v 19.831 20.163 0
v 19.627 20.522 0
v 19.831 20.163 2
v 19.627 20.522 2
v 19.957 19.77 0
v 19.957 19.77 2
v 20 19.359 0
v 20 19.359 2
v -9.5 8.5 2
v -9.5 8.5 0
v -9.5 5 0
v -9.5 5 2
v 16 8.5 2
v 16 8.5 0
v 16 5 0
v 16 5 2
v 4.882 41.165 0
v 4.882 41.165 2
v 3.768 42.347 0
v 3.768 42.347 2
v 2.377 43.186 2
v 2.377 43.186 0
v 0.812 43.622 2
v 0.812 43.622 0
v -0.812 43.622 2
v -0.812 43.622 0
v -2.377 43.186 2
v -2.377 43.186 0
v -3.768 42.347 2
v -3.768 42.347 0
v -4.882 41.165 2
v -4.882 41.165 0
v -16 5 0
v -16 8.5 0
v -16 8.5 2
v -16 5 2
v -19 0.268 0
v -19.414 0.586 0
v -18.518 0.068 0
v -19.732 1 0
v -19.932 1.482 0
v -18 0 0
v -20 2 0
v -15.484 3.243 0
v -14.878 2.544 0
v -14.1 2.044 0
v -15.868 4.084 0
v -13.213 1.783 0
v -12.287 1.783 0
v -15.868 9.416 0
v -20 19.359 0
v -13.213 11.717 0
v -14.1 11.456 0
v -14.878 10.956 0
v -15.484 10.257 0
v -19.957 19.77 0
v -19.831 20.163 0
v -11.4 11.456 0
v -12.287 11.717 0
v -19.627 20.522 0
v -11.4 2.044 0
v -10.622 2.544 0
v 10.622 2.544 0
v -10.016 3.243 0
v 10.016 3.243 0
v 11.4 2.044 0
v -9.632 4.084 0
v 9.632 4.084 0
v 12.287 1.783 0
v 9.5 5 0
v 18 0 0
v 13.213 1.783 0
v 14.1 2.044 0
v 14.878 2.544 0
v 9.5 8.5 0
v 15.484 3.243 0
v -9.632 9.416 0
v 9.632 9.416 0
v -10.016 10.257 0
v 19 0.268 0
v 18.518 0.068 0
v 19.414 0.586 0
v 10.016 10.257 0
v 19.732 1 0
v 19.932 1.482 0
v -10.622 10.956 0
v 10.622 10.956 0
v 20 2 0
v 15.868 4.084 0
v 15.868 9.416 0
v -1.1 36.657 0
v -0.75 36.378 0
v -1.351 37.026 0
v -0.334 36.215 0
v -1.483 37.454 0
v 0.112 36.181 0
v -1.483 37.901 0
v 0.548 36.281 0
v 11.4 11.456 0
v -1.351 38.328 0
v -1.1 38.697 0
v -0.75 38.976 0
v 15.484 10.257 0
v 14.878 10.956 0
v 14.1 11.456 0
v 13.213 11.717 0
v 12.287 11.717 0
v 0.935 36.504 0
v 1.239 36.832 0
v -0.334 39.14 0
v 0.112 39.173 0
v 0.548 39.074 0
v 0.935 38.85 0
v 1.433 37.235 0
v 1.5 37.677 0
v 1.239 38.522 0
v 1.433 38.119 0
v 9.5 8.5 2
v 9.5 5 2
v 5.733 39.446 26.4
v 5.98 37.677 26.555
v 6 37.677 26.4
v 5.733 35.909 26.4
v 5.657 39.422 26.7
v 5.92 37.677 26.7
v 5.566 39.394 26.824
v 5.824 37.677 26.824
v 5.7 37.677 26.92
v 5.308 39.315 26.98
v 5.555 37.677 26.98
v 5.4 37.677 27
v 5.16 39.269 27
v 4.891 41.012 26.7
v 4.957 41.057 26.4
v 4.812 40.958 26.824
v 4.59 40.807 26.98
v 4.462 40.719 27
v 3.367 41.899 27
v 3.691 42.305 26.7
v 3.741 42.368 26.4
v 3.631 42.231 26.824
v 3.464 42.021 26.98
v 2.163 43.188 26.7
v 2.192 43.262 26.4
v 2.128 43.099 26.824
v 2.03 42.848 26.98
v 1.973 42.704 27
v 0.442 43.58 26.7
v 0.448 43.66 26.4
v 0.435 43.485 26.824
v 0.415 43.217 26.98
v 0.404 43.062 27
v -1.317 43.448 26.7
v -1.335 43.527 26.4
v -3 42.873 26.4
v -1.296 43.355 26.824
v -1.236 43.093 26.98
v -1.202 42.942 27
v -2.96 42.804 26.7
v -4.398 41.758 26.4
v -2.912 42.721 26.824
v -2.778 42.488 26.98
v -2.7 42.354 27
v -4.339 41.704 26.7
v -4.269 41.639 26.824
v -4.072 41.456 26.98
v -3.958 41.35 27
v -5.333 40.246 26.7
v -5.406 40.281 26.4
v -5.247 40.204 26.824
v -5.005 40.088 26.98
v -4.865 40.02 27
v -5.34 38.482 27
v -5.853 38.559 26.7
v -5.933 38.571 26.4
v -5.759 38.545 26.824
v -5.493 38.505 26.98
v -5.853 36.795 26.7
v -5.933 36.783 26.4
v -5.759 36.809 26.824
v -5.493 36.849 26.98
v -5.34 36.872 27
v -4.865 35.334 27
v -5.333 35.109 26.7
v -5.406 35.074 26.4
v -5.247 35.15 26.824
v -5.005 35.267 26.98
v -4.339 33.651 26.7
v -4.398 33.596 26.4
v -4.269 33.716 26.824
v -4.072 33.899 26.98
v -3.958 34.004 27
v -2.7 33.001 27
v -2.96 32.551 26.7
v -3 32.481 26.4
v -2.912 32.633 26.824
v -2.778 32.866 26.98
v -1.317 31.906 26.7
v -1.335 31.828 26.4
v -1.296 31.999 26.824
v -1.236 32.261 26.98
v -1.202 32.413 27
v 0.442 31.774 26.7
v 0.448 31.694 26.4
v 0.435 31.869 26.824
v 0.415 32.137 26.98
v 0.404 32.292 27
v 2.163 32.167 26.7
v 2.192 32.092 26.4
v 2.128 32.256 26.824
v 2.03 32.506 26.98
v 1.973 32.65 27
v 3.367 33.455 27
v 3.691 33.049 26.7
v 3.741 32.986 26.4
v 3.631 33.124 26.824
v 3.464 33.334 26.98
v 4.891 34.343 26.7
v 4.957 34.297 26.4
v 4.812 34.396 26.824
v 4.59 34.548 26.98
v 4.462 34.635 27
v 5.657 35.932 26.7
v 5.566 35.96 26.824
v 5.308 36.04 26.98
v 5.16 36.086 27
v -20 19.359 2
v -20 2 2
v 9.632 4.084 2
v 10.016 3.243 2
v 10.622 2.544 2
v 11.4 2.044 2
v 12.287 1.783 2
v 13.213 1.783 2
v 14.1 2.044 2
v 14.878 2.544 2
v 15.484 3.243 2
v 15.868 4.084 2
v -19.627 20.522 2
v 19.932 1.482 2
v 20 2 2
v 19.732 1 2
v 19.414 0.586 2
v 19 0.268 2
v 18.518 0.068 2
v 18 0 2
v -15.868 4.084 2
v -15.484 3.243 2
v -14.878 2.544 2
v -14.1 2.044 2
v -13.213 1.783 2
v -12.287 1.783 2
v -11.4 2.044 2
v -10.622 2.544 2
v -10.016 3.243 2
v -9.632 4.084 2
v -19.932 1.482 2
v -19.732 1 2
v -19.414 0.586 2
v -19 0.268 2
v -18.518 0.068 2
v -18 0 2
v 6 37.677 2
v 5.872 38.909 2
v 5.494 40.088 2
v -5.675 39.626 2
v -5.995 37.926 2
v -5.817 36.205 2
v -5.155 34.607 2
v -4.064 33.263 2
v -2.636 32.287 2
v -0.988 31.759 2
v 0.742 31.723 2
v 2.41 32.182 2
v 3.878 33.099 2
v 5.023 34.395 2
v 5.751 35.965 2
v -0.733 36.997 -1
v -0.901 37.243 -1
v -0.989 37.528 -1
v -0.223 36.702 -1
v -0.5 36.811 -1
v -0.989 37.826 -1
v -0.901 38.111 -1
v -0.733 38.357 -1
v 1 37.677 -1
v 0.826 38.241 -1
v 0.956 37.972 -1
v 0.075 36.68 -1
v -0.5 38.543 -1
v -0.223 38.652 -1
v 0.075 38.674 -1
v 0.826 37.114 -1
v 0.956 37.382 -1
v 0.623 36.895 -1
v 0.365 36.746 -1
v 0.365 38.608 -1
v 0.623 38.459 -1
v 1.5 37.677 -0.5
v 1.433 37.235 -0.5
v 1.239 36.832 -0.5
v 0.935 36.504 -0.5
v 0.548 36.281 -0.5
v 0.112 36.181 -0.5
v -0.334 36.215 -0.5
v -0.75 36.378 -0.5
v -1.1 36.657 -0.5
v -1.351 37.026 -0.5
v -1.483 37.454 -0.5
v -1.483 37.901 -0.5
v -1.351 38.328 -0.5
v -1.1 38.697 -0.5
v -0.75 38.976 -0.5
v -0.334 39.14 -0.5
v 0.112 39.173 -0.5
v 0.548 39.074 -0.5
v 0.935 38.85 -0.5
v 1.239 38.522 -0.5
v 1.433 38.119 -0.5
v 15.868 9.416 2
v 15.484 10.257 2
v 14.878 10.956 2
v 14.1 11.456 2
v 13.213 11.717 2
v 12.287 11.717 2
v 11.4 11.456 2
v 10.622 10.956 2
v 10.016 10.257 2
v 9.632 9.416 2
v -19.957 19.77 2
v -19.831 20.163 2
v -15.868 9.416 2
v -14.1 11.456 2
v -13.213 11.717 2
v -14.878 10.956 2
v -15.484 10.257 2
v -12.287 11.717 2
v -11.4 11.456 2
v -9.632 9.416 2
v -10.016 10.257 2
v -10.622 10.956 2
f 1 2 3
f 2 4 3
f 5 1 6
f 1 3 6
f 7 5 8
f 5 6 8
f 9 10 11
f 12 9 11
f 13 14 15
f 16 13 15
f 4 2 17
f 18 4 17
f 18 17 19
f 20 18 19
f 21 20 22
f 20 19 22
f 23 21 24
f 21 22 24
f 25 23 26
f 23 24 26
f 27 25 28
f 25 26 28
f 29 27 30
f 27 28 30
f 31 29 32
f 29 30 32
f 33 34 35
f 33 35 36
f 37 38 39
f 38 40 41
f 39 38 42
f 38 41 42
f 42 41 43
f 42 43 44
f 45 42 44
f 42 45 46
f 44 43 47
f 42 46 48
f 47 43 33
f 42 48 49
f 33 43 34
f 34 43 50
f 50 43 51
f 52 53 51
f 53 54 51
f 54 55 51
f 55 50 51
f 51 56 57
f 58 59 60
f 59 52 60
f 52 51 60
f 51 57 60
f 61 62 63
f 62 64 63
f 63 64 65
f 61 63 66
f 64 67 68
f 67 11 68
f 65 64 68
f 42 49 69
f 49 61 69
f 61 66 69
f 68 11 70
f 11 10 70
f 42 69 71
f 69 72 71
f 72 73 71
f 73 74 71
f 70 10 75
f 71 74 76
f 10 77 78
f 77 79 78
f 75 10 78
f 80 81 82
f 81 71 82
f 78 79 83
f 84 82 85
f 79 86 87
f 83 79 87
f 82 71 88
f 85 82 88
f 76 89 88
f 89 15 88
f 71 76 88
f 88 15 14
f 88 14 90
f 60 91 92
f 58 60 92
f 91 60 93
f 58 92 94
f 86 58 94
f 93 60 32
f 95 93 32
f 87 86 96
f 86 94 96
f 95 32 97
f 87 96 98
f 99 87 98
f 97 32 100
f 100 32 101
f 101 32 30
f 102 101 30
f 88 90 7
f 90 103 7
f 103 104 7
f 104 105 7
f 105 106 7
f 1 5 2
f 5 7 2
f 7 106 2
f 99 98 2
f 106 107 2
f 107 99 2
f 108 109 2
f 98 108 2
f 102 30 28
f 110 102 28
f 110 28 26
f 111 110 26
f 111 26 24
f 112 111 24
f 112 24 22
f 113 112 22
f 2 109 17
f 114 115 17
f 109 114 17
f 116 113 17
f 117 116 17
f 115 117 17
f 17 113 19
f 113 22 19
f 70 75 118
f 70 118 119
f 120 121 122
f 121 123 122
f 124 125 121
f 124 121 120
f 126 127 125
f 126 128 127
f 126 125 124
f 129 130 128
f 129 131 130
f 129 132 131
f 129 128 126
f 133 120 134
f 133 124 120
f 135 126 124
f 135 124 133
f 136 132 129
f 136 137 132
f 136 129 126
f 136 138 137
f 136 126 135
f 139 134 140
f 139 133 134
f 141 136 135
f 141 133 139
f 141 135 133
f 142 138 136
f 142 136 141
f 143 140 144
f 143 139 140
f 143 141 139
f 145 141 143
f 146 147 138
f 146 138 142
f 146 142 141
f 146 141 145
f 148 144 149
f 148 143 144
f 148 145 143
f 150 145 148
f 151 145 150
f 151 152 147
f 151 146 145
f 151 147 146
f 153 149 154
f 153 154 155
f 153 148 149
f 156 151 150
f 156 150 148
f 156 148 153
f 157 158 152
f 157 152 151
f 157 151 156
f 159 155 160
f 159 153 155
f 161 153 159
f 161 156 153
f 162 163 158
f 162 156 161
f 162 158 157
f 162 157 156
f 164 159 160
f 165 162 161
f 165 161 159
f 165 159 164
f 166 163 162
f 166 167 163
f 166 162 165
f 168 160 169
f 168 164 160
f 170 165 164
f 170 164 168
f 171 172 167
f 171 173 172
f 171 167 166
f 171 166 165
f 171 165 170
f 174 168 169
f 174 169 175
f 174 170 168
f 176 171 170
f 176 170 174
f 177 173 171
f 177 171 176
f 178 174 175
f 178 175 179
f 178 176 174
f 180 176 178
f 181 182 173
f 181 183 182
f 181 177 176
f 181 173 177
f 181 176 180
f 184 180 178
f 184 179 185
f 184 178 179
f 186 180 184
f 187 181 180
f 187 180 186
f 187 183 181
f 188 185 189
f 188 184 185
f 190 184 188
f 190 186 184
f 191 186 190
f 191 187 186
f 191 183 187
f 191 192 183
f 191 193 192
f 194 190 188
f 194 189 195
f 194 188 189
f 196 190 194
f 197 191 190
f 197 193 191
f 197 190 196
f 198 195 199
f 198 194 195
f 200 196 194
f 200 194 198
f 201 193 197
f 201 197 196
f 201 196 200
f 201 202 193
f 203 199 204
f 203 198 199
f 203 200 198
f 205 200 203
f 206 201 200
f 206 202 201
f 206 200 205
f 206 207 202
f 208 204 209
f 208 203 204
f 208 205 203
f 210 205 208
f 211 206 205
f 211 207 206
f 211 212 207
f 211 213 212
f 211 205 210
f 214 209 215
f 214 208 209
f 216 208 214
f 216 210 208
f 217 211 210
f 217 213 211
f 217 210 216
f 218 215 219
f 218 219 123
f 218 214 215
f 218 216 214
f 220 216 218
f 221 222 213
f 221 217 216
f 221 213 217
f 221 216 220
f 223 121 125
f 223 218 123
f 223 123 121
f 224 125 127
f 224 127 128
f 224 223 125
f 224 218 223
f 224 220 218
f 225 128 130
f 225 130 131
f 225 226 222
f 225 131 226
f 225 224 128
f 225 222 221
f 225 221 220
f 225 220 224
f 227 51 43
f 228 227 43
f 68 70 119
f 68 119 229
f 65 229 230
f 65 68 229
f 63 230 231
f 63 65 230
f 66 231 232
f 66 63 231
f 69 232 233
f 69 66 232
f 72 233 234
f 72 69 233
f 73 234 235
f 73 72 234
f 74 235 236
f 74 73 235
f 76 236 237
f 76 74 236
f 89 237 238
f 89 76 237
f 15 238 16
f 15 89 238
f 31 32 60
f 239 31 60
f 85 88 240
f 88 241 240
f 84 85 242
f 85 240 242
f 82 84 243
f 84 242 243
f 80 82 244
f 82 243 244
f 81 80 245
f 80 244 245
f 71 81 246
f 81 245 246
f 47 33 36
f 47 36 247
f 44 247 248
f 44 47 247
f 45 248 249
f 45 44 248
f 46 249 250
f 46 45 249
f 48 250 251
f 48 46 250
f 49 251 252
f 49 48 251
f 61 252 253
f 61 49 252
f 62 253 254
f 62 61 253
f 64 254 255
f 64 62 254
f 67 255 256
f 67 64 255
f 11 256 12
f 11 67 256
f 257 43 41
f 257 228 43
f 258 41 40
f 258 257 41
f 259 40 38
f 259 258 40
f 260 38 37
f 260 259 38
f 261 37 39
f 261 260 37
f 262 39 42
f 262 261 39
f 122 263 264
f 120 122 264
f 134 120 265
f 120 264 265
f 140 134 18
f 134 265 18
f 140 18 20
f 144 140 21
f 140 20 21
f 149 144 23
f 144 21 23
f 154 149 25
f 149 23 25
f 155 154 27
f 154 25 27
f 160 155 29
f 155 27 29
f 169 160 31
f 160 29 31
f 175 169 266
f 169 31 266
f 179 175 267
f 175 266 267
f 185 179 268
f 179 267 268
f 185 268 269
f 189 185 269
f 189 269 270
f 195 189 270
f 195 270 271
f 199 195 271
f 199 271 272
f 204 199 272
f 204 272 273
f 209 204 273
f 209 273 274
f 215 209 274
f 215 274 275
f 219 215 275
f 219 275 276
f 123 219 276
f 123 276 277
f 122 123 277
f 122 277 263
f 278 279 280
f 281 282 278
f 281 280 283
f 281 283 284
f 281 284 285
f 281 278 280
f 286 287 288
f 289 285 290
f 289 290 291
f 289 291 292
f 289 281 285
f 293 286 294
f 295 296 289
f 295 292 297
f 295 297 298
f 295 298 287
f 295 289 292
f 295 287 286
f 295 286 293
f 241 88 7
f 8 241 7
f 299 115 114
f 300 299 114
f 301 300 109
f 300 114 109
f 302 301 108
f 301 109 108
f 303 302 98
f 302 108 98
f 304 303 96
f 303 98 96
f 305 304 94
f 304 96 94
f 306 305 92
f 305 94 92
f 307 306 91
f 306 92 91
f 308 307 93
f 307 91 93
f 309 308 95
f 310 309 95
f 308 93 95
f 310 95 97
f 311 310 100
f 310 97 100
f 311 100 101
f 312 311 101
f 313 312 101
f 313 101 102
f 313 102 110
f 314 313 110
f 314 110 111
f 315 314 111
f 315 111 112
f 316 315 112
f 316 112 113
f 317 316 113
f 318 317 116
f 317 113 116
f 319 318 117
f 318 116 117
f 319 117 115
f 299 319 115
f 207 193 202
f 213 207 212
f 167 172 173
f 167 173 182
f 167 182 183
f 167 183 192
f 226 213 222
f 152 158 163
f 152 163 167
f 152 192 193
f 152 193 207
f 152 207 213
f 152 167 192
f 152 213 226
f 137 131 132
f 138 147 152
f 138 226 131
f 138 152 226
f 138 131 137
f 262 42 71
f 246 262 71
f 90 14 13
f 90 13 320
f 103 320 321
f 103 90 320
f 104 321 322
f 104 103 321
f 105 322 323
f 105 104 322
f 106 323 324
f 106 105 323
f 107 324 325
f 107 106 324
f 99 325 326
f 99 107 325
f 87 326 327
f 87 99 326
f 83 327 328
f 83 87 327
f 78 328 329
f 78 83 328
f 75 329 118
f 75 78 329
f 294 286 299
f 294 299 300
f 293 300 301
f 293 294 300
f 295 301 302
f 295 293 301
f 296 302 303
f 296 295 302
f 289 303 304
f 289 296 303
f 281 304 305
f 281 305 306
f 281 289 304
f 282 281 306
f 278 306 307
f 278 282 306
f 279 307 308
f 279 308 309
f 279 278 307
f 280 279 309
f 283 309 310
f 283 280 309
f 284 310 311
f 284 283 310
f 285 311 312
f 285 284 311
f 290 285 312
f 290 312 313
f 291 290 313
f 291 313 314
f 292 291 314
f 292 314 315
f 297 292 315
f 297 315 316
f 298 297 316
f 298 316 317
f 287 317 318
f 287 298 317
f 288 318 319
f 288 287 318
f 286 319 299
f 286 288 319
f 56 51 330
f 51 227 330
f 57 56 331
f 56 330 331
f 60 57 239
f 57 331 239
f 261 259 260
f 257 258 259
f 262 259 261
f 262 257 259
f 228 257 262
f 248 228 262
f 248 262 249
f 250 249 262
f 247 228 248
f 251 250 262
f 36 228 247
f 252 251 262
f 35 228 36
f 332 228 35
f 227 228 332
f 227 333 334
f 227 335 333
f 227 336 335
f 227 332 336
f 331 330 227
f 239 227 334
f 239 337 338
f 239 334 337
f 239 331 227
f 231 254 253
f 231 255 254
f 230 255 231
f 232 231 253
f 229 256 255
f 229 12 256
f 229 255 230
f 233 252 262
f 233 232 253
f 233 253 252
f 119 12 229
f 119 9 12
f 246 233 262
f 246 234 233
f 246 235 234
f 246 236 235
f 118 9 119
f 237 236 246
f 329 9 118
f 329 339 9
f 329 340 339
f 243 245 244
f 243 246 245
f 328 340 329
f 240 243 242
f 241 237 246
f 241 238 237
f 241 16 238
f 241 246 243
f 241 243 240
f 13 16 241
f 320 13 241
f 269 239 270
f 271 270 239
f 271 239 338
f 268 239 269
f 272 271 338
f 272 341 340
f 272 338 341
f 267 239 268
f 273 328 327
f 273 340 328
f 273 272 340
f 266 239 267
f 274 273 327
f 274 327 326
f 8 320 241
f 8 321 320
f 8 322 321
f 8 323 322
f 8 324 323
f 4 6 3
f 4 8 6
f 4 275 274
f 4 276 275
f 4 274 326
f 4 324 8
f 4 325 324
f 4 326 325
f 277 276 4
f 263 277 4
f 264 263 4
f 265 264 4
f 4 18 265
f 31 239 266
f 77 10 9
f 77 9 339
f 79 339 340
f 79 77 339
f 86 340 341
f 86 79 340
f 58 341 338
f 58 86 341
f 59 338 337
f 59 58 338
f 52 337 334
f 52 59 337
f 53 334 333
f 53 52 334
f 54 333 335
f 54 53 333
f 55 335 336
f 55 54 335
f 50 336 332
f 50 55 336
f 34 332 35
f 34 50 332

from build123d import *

# Parameters (mm, degrees)
PAD_DEPTH    = 2
SKETCH001_R  = 6
PAD001_DEPTH = 25
SKETCH002_R  = 1.5
PAD002_DEPTH = 1
FILLET_R     = 2
FILLET001_R  = 0.6
CHAMFER_SIZE = 0.5


with BuildPart() as part:
    # Sketch → Pad (new body)
    with BuildSketch(Plane.XY):
        with BuildLine():
            Line((-20, 0), (20, 0))
            Line((20, 0), (20, 20))
            Line((20, 20), (4.882401, 41.164639))
            ThreePointArc((4.882401, 41.164639), (0, 43.67721), (-4.882401, 41.164639))
            Line((-4.882401, 41.164639), (-20, 20))
            Line((-20, 20), (-20, 0))
        make_face()
        with BuildLine():
            ThreePointArc((16, 8.5), (12.75, 11.75), (9.5, 8.5))
            Line((9.5, 8.5), (9.5, 5))
            ThreePointArc((9.5, 5), (12.75, 1.75), (16, 5))
            Line((16, 8.5), (16, 5))
        make_face(mode=Mode.SUBTRACT)
        with BuildLine():
            ThreePointArc((-9.5, 8.5), (-12.75, 11.75), (-16, 8.5))
            Line((-16, 8.5), (-16, 5))
            ThreePointArc((-16, 5), (-12.75, 1.75), (-9.5, 5))
            Line((-9.5, 8.5), (-9.5, 5))
        make_face(mode=Mode.SUBTRACT)
    extrude(amount=PAD_DEPTH)

    # Sketch001 (on Face16 of Pad) → Pad001 (join)
    with BuildSketch(Plane.XY.offset(2)):
        with Locations((0, 37.67721)):
            Circle(SKETCH001_R)
    extrude(amount=PAD001_DEPTH)

    # Sketch002 (on Face4 of Pad001) → Pad002 (join)
    with BuildSketch(Plane(origin=(0, 0, 0), x_dir=(1, 0, 0), z_dir=(0, 0, -1))):
        with Locations((0, -37.67721)):
            Circle(SKETCH002_R)
    extrude(amount=PAD002_DEPTH)

    # Fillet
    fillet_edges = [part.edges().sort_by_distance(p)[0] for p in [
        (20, 0, 1),
        (-20, 0, 1),
        (-20, 20, 1),
        (20, 20, 1),
    ]]
    fillet(fillet_edges, radius=FILLET_R)

    # Fillet001
    fillet001_edges = [part.edges().sort_by_distance(p)[0] for p in [
        (-6, 37.67721, 27),
    ]]
    fillet(fillet001_edges, radius=FILLET001_R)

    # Chamfer
    chamfer_edges = [part.edges().sort_by_distance(p)[0] for p in [
        (-1.5, 37.67721, -1),
    ]]
    chamfer(chamfer_edges, length=CHAMFER_SIZE)


solid = part.part
